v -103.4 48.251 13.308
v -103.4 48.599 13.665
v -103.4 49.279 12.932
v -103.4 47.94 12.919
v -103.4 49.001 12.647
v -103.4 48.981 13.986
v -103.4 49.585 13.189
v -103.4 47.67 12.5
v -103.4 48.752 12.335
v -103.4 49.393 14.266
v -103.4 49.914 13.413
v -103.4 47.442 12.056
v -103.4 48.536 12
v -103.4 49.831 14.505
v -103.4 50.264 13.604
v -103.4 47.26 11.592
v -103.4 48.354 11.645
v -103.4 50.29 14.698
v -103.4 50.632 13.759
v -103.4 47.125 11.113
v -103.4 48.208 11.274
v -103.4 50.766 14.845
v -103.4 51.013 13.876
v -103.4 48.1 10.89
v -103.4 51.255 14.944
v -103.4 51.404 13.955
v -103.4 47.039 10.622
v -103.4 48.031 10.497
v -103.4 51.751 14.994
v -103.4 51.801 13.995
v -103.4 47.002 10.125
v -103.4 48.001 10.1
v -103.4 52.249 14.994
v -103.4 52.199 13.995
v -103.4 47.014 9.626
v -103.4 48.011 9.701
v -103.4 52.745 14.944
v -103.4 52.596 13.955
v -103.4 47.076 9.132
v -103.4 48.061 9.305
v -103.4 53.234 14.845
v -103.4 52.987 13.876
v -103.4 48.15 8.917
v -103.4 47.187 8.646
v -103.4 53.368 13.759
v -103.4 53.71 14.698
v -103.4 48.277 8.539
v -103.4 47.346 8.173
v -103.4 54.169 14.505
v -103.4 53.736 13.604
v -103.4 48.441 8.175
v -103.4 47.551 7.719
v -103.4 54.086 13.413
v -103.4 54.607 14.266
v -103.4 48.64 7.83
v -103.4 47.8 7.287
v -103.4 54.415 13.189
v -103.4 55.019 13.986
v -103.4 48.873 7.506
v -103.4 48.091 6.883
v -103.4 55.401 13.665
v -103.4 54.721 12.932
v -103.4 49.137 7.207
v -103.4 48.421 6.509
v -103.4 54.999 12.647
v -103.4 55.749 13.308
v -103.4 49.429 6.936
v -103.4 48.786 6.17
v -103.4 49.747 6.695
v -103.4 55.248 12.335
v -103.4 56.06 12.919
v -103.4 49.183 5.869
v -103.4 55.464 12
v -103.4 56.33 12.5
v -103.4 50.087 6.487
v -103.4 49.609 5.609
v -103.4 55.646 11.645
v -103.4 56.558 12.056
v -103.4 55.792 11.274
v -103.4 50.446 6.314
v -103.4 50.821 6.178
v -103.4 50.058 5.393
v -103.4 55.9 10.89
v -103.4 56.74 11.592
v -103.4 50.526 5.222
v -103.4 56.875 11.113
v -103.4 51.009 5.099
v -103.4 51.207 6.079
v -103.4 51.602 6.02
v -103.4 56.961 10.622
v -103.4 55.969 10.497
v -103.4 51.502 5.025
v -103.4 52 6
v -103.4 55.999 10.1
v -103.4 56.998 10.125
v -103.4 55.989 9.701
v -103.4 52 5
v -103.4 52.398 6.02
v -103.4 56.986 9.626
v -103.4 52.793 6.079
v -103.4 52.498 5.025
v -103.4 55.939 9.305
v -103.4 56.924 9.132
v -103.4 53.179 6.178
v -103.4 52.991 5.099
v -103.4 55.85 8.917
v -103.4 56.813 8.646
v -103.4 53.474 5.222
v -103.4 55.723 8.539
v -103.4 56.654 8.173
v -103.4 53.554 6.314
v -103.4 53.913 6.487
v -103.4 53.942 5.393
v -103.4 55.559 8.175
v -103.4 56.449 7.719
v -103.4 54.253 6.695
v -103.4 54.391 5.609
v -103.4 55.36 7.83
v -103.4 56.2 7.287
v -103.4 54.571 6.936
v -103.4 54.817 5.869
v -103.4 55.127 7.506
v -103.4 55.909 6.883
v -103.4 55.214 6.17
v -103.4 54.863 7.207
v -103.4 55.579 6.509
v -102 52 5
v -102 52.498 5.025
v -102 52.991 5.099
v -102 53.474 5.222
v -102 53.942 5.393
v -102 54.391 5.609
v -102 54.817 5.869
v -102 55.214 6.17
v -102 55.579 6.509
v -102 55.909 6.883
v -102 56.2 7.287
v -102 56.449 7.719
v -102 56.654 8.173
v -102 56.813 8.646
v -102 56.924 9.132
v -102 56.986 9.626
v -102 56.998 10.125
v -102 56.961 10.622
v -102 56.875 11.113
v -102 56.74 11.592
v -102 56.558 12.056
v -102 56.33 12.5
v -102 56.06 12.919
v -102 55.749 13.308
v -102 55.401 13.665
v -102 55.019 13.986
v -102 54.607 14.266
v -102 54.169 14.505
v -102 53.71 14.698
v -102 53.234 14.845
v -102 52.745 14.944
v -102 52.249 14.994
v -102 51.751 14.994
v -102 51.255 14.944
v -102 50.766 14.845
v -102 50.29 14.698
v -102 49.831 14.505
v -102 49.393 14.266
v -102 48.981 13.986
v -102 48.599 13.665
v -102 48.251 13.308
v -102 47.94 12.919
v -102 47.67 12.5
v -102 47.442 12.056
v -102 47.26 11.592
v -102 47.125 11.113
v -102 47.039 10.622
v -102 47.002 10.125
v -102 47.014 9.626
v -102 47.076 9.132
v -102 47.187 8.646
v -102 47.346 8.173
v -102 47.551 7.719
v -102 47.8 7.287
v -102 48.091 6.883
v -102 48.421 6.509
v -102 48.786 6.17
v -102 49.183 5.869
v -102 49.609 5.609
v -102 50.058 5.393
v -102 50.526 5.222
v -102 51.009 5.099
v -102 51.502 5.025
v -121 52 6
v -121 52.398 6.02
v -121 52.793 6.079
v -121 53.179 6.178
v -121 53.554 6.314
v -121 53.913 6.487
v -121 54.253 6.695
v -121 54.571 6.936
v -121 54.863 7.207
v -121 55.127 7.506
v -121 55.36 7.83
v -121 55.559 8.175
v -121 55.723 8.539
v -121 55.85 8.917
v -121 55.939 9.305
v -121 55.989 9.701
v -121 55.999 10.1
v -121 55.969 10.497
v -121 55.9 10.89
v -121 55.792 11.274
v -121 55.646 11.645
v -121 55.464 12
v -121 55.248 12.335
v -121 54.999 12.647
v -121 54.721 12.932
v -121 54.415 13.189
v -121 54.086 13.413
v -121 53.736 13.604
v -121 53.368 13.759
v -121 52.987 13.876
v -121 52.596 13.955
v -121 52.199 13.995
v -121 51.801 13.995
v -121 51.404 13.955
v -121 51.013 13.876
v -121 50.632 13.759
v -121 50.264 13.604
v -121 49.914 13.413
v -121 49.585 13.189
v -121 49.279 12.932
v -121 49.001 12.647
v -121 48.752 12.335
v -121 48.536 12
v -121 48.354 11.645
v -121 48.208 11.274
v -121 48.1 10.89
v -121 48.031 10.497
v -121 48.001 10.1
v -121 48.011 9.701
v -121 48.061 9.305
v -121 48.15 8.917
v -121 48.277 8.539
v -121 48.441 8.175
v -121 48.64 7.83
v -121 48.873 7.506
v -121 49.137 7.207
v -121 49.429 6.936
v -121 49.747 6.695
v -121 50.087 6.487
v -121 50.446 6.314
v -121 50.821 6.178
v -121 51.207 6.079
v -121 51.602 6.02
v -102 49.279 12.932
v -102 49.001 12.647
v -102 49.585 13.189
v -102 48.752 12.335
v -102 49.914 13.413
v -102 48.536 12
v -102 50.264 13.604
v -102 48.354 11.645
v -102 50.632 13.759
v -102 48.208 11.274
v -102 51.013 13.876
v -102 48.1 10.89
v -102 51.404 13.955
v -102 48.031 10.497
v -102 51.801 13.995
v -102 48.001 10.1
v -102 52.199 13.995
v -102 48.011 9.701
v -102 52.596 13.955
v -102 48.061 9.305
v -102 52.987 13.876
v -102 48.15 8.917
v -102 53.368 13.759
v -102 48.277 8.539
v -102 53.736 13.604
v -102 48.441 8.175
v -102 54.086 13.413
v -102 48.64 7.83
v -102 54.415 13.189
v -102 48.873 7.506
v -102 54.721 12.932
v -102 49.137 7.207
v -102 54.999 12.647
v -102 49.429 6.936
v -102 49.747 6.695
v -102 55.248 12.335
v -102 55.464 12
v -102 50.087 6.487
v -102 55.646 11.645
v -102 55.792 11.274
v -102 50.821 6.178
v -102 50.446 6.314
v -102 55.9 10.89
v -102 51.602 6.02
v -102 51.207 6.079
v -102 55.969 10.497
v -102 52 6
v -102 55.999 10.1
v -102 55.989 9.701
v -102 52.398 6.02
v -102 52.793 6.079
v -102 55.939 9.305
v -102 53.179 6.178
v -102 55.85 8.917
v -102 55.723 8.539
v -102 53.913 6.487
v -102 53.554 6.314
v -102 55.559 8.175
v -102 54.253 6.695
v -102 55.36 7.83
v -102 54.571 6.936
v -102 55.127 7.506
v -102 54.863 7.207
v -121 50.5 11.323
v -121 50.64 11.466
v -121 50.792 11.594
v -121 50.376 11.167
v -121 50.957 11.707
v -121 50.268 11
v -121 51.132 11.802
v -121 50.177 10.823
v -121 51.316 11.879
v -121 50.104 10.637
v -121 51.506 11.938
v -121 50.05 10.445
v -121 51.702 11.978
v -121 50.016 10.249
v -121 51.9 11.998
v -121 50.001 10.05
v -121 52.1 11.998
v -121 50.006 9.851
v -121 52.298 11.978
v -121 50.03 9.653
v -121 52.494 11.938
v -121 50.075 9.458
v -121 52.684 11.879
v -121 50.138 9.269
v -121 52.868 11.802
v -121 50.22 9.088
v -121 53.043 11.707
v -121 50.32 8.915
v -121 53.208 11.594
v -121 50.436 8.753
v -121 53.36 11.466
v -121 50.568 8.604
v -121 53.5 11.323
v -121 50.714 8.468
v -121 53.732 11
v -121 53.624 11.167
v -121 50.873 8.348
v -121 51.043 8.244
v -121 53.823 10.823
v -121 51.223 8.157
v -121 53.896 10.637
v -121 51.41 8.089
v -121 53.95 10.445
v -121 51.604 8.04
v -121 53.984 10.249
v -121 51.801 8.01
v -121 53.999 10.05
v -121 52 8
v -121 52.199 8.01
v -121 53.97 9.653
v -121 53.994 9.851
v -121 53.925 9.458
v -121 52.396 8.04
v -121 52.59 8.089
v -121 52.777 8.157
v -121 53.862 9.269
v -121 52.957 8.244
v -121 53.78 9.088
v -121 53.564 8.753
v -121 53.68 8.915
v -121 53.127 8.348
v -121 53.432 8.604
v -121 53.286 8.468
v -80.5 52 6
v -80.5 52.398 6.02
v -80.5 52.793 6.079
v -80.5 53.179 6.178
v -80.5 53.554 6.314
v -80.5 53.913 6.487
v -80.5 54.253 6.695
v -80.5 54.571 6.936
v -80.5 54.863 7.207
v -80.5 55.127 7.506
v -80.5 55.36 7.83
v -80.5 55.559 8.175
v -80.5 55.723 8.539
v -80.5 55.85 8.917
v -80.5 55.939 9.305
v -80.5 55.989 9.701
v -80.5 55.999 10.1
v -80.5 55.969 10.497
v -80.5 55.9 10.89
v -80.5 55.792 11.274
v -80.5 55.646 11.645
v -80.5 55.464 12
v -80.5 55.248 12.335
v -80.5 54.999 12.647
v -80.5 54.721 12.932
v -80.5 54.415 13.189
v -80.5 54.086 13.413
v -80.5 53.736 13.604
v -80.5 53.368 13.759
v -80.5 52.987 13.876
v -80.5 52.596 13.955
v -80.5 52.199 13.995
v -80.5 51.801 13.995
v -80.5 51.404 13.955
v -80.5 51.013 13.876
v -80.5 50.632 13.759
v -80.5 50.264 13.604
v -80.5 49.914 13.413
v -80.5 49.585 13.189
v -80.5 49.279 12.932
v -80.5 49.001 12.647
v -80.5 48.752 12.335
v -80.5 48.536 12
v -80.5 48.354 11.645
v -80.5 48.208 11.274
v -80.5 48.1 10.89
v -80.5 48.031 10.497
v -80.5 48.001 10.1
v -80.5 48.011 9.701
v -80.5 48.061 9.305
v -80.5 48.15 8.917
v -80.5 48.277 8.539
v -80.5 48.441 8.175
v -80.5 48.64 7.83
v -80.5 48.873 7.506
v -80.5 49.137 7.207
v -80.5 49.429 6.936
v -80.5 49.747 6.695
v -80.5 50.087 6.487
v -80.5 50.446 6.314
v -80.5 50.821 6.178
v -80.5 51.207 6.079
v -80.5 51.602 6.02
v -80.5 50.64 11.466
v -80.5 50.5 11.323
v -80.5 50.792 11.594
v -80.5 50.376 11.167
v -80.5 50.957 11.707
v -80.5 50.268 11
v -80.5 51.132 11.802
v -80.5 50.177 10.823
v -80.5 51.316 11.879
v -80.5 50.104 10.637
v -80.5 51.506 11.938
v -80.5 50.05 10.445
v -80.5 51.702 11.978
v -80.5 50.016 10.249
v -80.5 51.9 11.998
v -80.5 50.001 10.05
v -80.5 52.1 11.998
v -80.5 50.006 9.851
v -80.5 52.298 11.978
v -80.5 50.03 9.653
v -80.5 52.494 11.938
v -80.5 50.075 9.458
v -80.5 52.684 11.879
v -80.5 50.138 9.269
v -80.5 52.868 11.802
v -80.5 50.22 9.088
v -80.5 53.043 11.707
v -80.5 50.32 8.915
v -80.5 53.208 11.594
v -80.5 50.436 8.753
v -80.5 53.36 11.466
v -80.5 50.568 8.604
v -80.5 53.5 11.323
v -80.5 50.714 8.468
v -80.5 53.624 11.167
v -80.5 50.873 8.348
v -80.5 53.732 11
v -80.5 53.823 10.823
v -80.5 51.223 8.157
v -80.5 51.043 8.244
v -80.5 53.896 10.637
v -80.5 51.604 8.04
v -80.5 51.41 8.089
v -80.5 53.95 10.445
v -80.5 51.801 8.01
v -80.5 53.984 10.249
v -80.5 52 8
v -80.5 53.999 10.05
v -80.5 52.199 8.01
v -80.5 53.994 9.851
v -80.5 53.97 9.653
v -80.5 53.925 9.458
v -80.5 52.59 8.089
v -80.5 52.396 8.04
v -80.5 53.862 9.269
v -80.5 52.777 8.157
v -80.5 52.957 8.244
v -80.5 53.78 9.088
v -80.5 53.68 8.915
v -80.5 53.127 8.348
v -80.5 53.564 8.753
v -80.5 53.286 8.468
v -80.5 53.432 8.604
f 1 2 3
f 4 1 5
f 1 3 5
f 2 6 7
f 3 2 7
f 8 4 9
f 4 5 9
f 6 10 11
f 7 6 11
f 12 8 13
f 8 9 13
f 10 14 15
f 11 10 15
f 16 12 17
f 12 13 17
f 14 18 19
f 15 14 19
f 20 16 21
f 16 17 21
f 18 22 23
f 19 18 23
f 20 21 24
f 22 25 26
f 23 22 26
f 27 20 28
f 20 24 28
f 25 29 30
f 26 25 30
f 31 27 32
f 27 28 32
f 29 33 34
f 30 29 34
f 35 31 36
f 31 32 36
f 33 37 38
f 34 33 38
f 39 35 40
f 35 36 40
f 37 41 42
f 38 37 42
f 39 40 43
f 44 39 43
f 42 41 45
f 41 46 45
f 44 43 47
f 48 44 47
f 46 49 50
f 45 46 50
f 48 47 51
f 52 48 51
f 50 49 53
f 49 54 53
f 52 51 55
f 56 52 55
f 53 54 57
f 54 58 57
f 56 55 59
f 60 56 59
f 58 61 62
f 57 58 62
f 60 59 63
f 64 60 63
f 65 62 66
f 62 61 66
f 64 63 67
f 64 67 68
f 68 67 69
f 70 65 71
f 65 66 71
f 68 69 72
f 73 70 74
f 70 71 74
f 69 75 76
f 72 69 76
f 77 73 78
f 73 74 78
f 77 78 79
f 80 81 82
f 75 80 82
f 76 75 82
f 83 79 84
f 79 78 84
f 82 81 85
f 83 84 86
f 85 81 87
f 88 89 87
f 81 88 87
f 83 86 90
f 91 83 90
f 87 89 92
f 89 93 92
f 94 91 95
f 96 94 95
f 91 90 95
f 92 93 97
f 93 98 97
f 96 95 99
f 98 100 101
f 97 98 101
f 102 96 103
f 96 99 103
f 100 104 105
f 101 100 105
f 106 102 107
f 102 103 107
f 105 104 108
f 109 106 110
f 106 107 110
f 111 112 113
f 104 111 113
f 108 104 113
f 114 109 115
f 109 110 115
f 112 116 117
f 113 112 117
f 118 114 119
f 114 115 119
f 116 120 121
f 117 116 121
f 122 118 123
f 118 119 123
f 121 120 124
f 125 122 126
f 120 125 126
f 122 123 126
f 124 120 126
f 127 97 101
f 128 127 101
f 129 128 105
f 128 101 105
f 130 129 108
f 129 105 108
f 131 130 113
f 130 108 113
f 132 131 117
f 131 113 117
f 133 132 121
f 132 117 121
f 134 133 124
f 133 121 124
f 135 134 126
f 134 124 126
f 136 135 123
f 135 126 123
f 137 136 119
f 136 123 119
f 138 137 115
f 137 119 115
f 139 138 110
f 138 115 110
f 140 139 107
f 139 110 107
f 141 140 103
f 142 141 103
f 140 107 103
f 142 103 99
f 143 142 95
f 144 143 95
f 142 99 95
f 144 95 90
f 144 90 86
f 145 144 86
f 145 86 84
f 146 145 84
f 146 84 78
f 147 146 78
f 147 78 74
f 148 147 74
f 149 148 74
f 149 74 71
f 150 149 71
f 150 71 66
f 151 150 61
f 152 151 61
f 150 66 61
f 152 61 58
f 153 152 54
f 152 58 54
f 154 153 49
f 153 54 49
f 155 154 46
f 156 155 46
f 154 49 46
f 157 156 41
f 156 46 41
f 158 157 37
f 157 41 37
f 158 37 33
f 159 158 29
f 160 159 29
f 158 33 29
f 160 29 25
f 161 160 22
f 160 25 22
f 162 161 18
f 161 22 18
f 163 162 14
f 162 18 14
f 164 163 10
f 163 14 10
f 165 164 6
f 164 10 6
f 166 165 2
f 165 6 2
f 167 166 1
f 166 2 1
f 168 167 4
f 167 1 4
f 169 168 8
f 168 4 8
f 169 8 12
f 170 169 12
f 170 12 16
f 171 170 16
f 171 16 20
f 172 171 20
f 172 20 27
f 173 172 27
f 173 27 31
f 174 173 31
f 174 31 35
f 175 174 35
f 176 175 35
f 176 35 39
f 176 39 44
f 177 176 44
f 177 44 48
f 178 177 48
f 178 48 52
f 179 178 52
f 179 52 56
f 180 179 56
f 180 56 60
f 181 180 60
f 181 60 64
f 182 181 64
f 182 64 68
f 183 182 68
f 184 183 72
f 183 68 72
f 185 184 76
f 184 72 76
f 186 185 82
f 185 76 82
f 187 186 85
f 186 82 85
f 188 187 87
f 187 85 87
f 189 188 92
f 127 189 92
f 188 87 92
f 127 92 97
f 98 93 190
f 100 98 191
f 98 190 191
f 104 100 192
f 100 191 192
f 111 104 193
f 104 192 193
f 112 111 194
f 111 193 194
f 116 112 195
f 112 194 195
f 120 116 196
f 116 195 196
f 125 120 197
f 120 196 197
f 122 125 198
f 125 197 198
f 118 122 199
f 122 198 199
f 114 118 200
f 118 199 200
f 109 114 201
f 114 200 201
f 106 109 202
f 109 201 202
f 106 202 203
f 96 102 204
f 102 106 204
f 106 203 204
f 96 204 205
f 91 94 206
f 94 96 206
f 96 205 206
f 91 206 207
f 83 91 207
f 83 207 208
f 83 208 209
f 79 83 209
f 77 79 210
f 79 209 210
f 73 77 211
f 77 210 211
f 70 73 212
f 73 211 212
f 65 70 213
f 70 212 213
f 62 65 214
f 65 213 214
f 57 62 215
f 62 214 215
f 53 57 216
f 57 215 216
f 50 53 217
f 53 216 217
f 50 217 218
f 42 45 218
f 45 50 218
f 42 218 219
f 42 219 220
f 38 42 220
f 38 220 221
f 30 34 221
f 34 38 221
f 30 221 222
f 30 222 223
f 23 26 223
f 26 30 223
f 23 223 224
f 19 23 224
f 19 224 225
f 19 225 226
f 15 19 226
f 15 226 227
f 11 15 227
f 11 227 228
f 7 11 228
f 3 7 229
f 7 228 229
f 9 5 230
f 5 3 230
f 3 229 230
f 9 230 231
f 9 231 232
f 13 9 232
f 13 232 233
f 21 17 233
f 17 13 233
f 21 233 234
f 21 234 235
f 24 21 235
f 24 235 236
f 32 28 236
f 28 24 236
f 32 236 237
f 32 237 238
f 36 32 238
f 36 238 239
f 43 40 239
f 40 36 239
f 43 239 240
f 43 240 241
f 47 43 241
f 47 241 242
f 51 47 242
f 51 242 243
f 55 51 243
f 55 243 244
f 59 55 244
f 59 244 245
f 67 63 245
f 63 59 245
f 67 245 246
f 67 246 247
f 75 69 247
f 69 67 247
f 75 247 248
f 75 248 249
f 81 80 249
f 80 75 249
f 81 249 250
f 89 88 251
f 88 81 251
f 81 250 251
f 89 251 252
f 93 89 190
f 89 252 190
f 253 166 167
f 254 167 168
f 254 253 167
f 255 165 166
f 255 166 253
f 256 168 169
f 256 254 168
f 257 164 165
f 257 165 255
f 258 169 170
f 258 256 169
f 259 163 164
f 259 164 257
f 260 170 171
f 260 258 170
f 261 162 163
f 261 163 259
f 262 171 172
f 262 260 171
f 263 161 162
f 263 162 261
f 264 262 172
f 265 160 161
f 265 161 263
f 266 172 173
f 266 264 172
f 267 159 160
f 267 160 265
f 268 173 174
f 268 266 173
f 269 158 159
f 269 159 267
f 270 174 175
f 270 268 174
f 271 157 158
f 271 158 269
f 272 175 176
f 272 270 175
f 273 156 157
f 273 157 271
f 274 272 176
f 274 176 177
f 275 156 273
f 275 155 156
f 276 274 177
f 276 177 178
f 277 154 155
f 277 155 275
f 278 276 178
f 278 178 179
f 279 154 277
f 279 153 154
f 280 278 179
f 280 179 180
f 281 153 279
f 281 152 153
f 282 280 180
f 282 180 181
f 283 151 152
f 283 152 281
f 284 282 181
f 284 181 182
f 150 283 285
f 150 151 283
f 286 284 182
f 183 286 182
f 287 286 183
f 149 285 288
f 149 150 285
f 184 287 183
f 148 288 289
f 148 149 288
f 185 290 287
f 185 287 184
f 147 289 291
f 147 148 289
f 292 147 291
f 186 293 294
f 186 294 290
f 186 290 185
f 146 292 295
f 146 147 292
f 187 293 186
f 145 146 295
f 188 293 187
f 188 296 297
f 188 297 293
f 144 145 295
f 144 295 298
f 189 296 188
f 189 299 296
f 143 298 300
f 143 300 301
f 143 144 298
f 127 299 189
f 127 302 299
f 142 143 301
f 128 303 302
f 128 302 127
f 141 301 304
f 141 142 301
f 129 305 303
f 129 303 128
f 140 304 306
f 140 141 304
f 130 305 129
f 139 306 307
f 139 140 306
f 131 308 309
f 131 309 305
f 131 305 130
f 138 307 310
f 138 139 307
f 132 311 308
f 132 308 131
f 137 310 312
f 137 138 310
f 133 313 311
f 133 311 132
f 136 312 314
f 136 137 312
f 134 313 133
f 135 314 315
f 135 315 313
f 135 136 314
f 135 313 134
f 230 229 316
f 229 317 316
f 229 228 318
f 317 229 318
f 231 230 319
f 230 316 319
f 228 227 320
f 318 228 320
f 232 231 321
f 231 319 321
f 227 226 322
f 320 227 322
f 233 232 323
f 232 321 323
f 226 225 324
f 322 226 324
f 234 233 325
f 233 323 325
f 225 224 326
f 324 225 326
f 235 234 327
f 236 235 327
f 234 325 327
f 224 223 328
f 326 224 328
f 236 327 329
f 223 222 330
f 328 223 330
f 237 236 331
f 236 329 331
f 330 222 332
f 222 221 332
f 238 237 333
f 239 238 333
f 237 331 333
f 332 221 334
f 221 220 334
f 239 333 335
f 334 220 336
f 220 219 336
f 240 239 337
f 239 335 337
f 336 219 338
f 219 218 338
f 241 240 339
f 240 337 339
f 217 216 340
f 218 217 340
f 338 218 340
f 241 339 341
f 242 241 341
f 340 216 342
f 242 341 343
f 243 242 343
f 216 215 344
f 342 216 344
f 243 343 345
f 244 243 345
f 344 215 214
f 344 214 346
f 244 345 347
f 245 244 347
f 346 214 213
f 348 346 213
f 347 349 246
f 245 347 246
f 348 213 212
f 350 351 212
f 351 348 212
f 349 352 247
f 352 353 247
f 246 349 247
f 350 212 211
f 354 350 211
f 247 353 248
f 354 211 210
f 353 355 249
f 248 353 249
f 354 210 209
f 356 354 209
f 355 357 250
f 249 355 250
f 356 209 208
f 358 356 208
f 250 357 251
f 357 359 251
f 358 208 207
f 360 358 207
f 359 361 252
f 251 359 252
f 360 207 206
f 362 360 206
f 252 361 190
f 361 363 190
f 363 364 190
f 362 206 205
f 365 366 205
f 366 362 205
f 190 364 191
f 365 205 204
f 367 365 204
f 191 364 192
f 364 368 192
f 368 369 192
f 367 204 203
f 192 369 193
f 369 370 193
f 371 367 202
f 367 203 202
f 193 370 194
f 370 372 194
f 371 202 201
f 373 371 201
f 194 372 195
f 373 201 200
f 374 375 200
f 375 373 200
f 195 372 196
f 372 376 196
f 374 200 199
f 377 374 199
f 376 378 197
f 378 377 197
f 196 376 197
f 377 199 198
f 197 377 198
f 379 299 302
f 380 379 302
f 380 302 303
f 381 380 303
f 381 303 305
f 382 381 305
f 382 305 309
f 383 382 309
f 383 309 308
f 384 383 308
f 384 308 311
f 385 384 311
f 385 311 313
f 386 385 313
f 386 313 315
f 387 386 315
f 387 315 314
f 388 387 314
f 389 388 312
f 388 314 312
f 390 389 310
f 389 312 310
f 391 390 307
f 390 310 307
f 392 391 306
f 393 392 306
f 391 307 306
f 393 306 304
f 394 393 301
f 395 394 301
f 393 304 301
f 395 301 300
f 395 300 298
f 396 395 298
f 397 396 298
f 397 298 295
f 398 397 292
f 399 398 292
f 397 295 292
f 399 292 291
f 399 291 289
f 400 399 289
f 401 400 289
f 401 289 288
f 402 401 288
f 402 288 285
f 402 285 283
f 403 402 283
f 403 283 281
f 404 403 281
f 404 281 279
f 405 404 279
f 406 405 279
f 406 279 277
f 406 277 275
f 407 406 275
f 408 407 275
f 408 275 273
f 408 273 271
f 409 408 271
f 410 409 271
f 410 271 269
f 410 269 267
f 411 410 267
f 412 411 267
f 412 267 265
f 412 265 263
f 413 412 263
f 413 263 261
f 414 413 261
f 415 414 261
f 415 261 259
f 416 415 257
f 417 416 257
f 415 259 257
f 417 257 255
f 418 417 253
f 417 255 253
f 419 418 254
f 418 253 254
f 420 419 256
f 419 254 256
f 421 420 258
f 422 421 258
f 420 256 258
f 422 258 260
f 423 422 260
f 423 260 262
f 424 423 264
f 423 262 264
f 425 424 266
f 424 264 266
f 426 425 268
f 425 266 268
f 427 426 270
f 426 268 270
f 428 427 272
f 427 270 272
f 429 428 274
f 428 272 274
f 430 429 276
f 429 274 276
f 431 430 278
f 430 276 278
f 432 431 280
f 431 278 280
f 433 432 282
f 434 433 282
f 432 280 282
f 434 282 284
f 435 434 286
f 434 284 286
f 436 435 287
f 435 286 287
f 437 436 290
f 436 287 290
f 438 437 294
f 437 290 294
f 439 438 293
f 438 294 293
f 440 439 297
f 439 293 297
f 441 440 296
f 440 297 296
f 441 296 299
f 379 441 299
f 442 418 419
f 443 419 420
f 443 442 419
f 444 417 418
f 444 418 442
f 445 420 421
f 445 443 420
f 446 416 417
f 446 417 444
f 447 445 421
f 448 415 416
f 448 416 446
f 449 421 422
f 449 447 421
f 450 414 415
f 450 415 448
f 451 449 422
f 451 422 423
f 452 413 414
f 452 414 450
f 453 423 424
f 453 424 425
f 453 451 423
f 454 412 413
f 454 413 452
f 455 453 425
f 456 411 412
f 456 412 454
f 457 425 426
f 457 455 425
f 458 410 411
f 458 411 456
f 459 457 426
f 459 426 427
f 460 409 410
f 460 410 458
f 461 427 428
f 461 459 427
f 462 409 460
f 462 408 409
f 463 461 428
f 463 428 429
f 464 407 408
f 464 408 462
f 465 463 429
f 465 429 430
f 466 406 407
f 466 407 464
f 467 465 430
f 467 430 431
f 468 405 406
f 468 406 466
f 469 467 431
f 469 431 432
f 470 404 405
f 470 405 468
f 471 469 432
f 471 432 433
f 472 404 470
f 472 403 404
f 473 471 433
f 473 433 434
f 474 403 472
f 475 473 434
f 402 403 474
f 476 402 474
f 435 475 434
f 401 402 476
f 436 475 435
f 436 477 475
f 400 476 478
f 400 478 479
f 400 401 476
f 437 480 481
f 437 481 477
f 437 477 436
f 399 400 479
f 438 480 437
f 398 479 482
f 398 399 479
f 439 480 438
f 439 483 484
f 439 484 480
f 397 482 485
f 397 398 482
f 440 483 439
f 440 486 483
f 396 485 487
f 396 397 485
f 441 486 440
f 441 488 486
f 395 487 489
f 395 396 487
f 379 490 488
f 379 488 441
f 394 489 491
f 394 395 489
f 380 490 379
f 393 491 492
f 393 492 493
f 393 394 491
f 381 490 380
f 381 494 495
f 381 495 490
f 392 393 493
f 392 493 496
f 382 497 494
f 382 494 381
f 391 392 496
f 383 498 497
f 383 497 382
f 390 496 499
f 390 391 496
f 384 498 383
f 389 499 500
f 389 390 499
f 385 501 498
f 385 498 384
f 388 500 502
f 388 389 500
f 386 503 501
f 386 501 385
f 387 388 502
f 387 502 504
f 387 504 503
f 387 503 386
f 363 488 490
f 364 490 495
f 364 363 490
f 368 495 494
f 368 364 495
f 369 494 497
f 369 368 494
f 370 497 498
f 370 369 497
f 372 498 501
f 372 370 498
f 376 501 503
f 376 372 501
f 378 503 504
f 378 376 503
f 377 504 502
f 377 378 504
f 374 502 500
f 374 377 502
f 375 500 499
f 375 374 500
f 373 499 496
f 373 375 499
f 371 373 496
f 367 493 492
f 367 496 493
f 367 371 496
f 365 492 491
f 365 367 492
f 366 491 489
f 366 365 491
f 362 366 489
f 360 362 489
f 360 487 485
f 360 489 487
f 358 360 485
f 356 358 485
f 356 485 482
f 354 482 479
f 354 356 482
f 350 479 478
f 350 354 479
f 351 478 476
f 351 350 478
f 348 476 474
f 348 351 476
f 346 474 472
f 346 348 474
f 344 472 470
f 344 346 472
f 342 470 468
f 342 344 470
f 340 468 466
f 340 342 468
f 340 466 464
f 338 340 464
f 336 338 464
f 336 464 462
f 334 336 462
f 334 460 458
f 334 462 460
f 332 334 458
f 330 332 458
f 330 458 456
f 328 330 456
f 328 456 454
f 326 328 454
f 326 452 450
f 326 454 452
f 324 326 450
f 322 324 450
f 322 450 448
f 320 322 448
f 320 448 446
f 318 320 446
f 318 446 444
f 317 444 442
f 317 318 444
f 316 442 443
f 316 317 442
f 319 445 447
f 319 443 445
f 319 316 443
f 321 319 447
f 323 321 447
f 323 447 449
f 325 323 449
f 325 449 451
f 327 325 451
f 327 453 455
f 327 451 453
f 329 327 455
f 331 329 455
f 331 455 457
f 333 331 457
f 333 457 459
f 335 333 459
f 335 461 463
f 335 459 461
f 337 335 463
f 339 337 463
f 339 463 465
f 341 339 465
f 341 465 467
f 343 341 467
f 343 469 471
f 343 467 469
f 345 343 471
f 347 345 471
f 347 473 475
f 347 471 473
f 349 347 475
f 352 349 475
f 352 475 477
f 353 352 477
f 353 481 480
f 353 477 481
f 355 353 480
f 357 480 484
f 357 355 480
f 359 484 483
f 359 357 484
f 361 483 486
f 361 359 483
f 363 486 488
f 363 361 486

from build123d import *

# Parameters (mm, degrees)
CYLINDER138_R     = 2
CYLINDER138_DEPTH = 47.8
CYLINDER091_R     = 5
CYLINDER091_DEPTH = 1.4
CYLINDER072_R     = 4
CYLINDER072_DEPTH = 40.5


with BuildPart() as cylinder138:
    # Cylinder138 → Cylinder138 (new body)
    with BuildSketch(Plane(origin=(-125, 62, 10), x_dir=(0, 0, -1), z_dir=(1, 0, 0))):
        Circle(CYLINDER138_R)
    extrude(amount=CYLINDER138_DEPTH)


with BuildPart() as cylinder091:
    # Cylinder091 → Cylinder091 (new body)
    with BuildSketch(Plane(origin=(-107.4, 62, 10), x_dir=(0, 0, -1), z_dir=(1, 0, 0))):
        Circle(CYLINDER091_R)
    extrude(amount=CYLINDER091_DEPTH)


with BuildPart() as cut095:
    # Cylinder072 → Cylinder072 (new body)
    with BuildSketch(Plane(origin=(-125, 62, 10), x_dir=(0, 0, -1), z_dir=(1, 0, 0))):
        Circle(CYLINDER072_R)
    extrude(amount=CYLINDER072_DEPTH)

    # Fusion142: union Cylinder091
    add(cylinder091.part)

    # Cut095: cut Cylinder138
    add(cylinder138.part, mode=Mode.SUBTRACT)


with BuildPart() as cut095_1:
    # Cut095 placement: moved
    add(cut095.part.moved(Location((4, -10, 0))))


solid = cut095_1.part
